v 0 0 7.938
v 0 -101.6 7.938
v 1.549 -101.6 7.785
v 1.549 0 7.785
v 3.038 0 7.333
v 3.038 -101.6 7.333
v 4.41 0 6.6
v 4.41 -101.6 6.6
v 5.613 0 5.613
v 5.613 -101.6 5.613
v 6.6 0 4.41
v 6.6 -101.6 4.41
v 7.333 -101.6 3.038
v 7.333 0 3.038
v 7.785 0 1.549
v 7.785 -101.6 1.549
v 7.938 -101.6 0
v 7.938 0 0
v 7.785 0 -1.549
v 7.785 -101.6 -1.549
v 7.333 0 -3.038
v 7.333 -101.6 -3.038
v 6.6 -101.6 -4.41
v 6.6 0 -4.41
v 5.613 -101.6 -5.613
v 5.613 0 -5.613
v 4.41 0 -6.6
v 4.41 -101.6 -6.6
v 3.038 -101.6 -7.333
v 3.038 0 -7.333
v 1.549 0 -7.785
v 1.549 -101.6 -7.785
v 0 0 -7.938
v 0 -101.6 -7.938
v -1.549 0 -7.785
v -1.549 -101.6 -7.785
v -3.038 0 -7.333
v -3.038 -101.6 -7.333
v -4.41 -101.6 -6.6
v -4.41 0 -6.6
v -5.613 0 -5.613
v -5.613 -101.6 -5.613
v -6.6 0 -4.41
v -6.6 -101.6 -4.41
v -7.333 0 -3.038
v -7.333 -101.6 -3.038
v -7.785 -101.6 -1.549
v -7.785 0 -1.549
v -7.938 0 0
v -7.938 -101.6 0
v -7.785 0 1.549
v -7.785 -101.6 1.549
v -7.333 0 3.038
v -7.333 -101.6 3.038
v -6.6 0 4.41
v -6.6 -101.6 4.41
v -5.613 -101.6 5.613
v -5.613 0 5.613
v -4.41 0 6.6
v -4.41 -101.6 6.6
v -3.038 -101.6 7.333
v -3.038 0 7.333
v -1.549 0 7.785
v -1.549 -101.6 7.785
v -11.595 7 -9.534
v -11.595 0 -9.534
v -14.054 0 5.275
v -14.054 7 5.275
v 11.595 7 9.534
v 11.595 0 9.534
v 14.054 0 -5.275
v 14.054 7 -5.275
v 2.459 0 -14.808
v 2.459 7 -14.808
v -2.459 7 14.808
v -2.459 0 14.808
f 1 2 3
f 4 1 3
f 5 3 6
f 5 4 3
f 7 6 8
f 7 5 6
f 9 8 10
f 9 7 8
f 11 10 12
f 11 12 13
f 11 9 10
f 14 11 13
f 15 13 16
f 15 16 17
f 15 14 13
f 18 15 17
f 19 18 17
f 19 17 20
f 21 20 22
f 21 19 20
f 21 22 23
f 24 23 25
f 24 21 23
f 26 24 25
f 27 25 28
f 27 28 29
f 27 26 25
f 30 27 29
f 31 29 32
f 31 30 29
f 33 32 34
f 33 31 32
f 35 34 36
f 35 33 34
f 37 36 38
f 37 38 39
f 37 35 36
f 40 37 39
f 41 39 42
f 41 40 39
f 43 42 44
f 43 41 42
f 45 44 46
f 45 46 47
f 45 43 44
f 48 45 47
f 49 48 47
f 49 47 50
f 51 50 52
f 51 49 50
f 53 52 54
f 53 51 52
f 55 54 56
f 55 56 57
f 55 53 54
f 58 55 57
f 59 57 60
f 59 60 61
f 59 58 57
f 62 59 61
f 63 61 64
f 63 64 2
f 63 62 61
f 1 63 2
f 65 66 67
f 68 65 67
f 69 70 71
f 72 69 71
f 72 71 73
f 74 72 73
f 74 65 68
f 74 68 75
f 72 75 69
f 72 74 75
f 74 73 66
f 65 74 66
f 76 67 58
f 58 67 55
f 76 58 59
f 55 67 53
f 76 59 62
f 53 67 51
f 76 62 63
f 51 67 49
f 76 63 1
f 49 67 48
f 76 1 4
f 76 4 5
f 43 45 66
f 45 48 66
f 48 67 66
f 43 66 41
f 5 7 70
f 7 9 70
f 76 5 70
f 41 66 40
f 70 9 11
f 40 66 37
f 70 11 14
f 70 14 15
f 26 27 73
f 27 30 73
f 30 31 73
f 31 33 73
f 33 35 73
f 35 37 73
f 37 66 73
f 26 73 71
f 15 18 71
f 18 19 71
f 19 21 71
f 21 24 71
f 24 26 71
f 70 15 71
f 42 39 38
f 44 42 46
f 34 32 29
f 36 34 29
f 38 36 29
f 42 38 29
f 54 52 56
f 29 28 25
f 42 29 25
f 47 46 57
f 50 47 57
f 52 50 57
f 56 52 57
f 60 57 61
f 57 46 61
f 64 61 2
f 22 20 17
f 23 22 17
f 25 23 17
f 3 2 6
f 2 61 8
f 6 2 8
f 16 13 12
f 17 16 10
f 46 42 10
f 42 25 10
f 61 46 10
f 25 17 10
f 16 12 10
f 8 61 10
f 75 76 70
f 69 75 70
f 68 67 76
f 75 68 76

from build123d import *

# Parameters (mm, degrees)
SKETCH1_R   = 7.9375
SHAFT_DEPTH = 101.6
HEAD_DEPTH  = 7


with BuildPart() as part:
    # Sketch1 → Shaft (new body)
    with BuildSketch(Plane(origin=(0, 0, 0), x_dir=(1, 0, 0), z_dir=(0, 1, 0))):
        with Locations(Location((0, 0, 0), (0, 0, 270))):
            Circle(SKETCH1_R)
    extrude(amount=-SHAFT_DEPTH)

    # Sketch2 → Head (add)
    with BuildSketch(Plane(origin=(0, 0, 0), x_dir=(1, 0, 0), z_dir=(0, 1, 0))):
        Polygon((11.595031913, -9.533549616), (14.053812112, 5.274817386), (2.458780199, 14.808367002), (-11.595031913, 9.533549616), (-14.053812112, -5.274817386), (-2.458780199, -14.808367002), align=None)
    extrude(amount=HEAD_DEPTH)


solid = part.part
